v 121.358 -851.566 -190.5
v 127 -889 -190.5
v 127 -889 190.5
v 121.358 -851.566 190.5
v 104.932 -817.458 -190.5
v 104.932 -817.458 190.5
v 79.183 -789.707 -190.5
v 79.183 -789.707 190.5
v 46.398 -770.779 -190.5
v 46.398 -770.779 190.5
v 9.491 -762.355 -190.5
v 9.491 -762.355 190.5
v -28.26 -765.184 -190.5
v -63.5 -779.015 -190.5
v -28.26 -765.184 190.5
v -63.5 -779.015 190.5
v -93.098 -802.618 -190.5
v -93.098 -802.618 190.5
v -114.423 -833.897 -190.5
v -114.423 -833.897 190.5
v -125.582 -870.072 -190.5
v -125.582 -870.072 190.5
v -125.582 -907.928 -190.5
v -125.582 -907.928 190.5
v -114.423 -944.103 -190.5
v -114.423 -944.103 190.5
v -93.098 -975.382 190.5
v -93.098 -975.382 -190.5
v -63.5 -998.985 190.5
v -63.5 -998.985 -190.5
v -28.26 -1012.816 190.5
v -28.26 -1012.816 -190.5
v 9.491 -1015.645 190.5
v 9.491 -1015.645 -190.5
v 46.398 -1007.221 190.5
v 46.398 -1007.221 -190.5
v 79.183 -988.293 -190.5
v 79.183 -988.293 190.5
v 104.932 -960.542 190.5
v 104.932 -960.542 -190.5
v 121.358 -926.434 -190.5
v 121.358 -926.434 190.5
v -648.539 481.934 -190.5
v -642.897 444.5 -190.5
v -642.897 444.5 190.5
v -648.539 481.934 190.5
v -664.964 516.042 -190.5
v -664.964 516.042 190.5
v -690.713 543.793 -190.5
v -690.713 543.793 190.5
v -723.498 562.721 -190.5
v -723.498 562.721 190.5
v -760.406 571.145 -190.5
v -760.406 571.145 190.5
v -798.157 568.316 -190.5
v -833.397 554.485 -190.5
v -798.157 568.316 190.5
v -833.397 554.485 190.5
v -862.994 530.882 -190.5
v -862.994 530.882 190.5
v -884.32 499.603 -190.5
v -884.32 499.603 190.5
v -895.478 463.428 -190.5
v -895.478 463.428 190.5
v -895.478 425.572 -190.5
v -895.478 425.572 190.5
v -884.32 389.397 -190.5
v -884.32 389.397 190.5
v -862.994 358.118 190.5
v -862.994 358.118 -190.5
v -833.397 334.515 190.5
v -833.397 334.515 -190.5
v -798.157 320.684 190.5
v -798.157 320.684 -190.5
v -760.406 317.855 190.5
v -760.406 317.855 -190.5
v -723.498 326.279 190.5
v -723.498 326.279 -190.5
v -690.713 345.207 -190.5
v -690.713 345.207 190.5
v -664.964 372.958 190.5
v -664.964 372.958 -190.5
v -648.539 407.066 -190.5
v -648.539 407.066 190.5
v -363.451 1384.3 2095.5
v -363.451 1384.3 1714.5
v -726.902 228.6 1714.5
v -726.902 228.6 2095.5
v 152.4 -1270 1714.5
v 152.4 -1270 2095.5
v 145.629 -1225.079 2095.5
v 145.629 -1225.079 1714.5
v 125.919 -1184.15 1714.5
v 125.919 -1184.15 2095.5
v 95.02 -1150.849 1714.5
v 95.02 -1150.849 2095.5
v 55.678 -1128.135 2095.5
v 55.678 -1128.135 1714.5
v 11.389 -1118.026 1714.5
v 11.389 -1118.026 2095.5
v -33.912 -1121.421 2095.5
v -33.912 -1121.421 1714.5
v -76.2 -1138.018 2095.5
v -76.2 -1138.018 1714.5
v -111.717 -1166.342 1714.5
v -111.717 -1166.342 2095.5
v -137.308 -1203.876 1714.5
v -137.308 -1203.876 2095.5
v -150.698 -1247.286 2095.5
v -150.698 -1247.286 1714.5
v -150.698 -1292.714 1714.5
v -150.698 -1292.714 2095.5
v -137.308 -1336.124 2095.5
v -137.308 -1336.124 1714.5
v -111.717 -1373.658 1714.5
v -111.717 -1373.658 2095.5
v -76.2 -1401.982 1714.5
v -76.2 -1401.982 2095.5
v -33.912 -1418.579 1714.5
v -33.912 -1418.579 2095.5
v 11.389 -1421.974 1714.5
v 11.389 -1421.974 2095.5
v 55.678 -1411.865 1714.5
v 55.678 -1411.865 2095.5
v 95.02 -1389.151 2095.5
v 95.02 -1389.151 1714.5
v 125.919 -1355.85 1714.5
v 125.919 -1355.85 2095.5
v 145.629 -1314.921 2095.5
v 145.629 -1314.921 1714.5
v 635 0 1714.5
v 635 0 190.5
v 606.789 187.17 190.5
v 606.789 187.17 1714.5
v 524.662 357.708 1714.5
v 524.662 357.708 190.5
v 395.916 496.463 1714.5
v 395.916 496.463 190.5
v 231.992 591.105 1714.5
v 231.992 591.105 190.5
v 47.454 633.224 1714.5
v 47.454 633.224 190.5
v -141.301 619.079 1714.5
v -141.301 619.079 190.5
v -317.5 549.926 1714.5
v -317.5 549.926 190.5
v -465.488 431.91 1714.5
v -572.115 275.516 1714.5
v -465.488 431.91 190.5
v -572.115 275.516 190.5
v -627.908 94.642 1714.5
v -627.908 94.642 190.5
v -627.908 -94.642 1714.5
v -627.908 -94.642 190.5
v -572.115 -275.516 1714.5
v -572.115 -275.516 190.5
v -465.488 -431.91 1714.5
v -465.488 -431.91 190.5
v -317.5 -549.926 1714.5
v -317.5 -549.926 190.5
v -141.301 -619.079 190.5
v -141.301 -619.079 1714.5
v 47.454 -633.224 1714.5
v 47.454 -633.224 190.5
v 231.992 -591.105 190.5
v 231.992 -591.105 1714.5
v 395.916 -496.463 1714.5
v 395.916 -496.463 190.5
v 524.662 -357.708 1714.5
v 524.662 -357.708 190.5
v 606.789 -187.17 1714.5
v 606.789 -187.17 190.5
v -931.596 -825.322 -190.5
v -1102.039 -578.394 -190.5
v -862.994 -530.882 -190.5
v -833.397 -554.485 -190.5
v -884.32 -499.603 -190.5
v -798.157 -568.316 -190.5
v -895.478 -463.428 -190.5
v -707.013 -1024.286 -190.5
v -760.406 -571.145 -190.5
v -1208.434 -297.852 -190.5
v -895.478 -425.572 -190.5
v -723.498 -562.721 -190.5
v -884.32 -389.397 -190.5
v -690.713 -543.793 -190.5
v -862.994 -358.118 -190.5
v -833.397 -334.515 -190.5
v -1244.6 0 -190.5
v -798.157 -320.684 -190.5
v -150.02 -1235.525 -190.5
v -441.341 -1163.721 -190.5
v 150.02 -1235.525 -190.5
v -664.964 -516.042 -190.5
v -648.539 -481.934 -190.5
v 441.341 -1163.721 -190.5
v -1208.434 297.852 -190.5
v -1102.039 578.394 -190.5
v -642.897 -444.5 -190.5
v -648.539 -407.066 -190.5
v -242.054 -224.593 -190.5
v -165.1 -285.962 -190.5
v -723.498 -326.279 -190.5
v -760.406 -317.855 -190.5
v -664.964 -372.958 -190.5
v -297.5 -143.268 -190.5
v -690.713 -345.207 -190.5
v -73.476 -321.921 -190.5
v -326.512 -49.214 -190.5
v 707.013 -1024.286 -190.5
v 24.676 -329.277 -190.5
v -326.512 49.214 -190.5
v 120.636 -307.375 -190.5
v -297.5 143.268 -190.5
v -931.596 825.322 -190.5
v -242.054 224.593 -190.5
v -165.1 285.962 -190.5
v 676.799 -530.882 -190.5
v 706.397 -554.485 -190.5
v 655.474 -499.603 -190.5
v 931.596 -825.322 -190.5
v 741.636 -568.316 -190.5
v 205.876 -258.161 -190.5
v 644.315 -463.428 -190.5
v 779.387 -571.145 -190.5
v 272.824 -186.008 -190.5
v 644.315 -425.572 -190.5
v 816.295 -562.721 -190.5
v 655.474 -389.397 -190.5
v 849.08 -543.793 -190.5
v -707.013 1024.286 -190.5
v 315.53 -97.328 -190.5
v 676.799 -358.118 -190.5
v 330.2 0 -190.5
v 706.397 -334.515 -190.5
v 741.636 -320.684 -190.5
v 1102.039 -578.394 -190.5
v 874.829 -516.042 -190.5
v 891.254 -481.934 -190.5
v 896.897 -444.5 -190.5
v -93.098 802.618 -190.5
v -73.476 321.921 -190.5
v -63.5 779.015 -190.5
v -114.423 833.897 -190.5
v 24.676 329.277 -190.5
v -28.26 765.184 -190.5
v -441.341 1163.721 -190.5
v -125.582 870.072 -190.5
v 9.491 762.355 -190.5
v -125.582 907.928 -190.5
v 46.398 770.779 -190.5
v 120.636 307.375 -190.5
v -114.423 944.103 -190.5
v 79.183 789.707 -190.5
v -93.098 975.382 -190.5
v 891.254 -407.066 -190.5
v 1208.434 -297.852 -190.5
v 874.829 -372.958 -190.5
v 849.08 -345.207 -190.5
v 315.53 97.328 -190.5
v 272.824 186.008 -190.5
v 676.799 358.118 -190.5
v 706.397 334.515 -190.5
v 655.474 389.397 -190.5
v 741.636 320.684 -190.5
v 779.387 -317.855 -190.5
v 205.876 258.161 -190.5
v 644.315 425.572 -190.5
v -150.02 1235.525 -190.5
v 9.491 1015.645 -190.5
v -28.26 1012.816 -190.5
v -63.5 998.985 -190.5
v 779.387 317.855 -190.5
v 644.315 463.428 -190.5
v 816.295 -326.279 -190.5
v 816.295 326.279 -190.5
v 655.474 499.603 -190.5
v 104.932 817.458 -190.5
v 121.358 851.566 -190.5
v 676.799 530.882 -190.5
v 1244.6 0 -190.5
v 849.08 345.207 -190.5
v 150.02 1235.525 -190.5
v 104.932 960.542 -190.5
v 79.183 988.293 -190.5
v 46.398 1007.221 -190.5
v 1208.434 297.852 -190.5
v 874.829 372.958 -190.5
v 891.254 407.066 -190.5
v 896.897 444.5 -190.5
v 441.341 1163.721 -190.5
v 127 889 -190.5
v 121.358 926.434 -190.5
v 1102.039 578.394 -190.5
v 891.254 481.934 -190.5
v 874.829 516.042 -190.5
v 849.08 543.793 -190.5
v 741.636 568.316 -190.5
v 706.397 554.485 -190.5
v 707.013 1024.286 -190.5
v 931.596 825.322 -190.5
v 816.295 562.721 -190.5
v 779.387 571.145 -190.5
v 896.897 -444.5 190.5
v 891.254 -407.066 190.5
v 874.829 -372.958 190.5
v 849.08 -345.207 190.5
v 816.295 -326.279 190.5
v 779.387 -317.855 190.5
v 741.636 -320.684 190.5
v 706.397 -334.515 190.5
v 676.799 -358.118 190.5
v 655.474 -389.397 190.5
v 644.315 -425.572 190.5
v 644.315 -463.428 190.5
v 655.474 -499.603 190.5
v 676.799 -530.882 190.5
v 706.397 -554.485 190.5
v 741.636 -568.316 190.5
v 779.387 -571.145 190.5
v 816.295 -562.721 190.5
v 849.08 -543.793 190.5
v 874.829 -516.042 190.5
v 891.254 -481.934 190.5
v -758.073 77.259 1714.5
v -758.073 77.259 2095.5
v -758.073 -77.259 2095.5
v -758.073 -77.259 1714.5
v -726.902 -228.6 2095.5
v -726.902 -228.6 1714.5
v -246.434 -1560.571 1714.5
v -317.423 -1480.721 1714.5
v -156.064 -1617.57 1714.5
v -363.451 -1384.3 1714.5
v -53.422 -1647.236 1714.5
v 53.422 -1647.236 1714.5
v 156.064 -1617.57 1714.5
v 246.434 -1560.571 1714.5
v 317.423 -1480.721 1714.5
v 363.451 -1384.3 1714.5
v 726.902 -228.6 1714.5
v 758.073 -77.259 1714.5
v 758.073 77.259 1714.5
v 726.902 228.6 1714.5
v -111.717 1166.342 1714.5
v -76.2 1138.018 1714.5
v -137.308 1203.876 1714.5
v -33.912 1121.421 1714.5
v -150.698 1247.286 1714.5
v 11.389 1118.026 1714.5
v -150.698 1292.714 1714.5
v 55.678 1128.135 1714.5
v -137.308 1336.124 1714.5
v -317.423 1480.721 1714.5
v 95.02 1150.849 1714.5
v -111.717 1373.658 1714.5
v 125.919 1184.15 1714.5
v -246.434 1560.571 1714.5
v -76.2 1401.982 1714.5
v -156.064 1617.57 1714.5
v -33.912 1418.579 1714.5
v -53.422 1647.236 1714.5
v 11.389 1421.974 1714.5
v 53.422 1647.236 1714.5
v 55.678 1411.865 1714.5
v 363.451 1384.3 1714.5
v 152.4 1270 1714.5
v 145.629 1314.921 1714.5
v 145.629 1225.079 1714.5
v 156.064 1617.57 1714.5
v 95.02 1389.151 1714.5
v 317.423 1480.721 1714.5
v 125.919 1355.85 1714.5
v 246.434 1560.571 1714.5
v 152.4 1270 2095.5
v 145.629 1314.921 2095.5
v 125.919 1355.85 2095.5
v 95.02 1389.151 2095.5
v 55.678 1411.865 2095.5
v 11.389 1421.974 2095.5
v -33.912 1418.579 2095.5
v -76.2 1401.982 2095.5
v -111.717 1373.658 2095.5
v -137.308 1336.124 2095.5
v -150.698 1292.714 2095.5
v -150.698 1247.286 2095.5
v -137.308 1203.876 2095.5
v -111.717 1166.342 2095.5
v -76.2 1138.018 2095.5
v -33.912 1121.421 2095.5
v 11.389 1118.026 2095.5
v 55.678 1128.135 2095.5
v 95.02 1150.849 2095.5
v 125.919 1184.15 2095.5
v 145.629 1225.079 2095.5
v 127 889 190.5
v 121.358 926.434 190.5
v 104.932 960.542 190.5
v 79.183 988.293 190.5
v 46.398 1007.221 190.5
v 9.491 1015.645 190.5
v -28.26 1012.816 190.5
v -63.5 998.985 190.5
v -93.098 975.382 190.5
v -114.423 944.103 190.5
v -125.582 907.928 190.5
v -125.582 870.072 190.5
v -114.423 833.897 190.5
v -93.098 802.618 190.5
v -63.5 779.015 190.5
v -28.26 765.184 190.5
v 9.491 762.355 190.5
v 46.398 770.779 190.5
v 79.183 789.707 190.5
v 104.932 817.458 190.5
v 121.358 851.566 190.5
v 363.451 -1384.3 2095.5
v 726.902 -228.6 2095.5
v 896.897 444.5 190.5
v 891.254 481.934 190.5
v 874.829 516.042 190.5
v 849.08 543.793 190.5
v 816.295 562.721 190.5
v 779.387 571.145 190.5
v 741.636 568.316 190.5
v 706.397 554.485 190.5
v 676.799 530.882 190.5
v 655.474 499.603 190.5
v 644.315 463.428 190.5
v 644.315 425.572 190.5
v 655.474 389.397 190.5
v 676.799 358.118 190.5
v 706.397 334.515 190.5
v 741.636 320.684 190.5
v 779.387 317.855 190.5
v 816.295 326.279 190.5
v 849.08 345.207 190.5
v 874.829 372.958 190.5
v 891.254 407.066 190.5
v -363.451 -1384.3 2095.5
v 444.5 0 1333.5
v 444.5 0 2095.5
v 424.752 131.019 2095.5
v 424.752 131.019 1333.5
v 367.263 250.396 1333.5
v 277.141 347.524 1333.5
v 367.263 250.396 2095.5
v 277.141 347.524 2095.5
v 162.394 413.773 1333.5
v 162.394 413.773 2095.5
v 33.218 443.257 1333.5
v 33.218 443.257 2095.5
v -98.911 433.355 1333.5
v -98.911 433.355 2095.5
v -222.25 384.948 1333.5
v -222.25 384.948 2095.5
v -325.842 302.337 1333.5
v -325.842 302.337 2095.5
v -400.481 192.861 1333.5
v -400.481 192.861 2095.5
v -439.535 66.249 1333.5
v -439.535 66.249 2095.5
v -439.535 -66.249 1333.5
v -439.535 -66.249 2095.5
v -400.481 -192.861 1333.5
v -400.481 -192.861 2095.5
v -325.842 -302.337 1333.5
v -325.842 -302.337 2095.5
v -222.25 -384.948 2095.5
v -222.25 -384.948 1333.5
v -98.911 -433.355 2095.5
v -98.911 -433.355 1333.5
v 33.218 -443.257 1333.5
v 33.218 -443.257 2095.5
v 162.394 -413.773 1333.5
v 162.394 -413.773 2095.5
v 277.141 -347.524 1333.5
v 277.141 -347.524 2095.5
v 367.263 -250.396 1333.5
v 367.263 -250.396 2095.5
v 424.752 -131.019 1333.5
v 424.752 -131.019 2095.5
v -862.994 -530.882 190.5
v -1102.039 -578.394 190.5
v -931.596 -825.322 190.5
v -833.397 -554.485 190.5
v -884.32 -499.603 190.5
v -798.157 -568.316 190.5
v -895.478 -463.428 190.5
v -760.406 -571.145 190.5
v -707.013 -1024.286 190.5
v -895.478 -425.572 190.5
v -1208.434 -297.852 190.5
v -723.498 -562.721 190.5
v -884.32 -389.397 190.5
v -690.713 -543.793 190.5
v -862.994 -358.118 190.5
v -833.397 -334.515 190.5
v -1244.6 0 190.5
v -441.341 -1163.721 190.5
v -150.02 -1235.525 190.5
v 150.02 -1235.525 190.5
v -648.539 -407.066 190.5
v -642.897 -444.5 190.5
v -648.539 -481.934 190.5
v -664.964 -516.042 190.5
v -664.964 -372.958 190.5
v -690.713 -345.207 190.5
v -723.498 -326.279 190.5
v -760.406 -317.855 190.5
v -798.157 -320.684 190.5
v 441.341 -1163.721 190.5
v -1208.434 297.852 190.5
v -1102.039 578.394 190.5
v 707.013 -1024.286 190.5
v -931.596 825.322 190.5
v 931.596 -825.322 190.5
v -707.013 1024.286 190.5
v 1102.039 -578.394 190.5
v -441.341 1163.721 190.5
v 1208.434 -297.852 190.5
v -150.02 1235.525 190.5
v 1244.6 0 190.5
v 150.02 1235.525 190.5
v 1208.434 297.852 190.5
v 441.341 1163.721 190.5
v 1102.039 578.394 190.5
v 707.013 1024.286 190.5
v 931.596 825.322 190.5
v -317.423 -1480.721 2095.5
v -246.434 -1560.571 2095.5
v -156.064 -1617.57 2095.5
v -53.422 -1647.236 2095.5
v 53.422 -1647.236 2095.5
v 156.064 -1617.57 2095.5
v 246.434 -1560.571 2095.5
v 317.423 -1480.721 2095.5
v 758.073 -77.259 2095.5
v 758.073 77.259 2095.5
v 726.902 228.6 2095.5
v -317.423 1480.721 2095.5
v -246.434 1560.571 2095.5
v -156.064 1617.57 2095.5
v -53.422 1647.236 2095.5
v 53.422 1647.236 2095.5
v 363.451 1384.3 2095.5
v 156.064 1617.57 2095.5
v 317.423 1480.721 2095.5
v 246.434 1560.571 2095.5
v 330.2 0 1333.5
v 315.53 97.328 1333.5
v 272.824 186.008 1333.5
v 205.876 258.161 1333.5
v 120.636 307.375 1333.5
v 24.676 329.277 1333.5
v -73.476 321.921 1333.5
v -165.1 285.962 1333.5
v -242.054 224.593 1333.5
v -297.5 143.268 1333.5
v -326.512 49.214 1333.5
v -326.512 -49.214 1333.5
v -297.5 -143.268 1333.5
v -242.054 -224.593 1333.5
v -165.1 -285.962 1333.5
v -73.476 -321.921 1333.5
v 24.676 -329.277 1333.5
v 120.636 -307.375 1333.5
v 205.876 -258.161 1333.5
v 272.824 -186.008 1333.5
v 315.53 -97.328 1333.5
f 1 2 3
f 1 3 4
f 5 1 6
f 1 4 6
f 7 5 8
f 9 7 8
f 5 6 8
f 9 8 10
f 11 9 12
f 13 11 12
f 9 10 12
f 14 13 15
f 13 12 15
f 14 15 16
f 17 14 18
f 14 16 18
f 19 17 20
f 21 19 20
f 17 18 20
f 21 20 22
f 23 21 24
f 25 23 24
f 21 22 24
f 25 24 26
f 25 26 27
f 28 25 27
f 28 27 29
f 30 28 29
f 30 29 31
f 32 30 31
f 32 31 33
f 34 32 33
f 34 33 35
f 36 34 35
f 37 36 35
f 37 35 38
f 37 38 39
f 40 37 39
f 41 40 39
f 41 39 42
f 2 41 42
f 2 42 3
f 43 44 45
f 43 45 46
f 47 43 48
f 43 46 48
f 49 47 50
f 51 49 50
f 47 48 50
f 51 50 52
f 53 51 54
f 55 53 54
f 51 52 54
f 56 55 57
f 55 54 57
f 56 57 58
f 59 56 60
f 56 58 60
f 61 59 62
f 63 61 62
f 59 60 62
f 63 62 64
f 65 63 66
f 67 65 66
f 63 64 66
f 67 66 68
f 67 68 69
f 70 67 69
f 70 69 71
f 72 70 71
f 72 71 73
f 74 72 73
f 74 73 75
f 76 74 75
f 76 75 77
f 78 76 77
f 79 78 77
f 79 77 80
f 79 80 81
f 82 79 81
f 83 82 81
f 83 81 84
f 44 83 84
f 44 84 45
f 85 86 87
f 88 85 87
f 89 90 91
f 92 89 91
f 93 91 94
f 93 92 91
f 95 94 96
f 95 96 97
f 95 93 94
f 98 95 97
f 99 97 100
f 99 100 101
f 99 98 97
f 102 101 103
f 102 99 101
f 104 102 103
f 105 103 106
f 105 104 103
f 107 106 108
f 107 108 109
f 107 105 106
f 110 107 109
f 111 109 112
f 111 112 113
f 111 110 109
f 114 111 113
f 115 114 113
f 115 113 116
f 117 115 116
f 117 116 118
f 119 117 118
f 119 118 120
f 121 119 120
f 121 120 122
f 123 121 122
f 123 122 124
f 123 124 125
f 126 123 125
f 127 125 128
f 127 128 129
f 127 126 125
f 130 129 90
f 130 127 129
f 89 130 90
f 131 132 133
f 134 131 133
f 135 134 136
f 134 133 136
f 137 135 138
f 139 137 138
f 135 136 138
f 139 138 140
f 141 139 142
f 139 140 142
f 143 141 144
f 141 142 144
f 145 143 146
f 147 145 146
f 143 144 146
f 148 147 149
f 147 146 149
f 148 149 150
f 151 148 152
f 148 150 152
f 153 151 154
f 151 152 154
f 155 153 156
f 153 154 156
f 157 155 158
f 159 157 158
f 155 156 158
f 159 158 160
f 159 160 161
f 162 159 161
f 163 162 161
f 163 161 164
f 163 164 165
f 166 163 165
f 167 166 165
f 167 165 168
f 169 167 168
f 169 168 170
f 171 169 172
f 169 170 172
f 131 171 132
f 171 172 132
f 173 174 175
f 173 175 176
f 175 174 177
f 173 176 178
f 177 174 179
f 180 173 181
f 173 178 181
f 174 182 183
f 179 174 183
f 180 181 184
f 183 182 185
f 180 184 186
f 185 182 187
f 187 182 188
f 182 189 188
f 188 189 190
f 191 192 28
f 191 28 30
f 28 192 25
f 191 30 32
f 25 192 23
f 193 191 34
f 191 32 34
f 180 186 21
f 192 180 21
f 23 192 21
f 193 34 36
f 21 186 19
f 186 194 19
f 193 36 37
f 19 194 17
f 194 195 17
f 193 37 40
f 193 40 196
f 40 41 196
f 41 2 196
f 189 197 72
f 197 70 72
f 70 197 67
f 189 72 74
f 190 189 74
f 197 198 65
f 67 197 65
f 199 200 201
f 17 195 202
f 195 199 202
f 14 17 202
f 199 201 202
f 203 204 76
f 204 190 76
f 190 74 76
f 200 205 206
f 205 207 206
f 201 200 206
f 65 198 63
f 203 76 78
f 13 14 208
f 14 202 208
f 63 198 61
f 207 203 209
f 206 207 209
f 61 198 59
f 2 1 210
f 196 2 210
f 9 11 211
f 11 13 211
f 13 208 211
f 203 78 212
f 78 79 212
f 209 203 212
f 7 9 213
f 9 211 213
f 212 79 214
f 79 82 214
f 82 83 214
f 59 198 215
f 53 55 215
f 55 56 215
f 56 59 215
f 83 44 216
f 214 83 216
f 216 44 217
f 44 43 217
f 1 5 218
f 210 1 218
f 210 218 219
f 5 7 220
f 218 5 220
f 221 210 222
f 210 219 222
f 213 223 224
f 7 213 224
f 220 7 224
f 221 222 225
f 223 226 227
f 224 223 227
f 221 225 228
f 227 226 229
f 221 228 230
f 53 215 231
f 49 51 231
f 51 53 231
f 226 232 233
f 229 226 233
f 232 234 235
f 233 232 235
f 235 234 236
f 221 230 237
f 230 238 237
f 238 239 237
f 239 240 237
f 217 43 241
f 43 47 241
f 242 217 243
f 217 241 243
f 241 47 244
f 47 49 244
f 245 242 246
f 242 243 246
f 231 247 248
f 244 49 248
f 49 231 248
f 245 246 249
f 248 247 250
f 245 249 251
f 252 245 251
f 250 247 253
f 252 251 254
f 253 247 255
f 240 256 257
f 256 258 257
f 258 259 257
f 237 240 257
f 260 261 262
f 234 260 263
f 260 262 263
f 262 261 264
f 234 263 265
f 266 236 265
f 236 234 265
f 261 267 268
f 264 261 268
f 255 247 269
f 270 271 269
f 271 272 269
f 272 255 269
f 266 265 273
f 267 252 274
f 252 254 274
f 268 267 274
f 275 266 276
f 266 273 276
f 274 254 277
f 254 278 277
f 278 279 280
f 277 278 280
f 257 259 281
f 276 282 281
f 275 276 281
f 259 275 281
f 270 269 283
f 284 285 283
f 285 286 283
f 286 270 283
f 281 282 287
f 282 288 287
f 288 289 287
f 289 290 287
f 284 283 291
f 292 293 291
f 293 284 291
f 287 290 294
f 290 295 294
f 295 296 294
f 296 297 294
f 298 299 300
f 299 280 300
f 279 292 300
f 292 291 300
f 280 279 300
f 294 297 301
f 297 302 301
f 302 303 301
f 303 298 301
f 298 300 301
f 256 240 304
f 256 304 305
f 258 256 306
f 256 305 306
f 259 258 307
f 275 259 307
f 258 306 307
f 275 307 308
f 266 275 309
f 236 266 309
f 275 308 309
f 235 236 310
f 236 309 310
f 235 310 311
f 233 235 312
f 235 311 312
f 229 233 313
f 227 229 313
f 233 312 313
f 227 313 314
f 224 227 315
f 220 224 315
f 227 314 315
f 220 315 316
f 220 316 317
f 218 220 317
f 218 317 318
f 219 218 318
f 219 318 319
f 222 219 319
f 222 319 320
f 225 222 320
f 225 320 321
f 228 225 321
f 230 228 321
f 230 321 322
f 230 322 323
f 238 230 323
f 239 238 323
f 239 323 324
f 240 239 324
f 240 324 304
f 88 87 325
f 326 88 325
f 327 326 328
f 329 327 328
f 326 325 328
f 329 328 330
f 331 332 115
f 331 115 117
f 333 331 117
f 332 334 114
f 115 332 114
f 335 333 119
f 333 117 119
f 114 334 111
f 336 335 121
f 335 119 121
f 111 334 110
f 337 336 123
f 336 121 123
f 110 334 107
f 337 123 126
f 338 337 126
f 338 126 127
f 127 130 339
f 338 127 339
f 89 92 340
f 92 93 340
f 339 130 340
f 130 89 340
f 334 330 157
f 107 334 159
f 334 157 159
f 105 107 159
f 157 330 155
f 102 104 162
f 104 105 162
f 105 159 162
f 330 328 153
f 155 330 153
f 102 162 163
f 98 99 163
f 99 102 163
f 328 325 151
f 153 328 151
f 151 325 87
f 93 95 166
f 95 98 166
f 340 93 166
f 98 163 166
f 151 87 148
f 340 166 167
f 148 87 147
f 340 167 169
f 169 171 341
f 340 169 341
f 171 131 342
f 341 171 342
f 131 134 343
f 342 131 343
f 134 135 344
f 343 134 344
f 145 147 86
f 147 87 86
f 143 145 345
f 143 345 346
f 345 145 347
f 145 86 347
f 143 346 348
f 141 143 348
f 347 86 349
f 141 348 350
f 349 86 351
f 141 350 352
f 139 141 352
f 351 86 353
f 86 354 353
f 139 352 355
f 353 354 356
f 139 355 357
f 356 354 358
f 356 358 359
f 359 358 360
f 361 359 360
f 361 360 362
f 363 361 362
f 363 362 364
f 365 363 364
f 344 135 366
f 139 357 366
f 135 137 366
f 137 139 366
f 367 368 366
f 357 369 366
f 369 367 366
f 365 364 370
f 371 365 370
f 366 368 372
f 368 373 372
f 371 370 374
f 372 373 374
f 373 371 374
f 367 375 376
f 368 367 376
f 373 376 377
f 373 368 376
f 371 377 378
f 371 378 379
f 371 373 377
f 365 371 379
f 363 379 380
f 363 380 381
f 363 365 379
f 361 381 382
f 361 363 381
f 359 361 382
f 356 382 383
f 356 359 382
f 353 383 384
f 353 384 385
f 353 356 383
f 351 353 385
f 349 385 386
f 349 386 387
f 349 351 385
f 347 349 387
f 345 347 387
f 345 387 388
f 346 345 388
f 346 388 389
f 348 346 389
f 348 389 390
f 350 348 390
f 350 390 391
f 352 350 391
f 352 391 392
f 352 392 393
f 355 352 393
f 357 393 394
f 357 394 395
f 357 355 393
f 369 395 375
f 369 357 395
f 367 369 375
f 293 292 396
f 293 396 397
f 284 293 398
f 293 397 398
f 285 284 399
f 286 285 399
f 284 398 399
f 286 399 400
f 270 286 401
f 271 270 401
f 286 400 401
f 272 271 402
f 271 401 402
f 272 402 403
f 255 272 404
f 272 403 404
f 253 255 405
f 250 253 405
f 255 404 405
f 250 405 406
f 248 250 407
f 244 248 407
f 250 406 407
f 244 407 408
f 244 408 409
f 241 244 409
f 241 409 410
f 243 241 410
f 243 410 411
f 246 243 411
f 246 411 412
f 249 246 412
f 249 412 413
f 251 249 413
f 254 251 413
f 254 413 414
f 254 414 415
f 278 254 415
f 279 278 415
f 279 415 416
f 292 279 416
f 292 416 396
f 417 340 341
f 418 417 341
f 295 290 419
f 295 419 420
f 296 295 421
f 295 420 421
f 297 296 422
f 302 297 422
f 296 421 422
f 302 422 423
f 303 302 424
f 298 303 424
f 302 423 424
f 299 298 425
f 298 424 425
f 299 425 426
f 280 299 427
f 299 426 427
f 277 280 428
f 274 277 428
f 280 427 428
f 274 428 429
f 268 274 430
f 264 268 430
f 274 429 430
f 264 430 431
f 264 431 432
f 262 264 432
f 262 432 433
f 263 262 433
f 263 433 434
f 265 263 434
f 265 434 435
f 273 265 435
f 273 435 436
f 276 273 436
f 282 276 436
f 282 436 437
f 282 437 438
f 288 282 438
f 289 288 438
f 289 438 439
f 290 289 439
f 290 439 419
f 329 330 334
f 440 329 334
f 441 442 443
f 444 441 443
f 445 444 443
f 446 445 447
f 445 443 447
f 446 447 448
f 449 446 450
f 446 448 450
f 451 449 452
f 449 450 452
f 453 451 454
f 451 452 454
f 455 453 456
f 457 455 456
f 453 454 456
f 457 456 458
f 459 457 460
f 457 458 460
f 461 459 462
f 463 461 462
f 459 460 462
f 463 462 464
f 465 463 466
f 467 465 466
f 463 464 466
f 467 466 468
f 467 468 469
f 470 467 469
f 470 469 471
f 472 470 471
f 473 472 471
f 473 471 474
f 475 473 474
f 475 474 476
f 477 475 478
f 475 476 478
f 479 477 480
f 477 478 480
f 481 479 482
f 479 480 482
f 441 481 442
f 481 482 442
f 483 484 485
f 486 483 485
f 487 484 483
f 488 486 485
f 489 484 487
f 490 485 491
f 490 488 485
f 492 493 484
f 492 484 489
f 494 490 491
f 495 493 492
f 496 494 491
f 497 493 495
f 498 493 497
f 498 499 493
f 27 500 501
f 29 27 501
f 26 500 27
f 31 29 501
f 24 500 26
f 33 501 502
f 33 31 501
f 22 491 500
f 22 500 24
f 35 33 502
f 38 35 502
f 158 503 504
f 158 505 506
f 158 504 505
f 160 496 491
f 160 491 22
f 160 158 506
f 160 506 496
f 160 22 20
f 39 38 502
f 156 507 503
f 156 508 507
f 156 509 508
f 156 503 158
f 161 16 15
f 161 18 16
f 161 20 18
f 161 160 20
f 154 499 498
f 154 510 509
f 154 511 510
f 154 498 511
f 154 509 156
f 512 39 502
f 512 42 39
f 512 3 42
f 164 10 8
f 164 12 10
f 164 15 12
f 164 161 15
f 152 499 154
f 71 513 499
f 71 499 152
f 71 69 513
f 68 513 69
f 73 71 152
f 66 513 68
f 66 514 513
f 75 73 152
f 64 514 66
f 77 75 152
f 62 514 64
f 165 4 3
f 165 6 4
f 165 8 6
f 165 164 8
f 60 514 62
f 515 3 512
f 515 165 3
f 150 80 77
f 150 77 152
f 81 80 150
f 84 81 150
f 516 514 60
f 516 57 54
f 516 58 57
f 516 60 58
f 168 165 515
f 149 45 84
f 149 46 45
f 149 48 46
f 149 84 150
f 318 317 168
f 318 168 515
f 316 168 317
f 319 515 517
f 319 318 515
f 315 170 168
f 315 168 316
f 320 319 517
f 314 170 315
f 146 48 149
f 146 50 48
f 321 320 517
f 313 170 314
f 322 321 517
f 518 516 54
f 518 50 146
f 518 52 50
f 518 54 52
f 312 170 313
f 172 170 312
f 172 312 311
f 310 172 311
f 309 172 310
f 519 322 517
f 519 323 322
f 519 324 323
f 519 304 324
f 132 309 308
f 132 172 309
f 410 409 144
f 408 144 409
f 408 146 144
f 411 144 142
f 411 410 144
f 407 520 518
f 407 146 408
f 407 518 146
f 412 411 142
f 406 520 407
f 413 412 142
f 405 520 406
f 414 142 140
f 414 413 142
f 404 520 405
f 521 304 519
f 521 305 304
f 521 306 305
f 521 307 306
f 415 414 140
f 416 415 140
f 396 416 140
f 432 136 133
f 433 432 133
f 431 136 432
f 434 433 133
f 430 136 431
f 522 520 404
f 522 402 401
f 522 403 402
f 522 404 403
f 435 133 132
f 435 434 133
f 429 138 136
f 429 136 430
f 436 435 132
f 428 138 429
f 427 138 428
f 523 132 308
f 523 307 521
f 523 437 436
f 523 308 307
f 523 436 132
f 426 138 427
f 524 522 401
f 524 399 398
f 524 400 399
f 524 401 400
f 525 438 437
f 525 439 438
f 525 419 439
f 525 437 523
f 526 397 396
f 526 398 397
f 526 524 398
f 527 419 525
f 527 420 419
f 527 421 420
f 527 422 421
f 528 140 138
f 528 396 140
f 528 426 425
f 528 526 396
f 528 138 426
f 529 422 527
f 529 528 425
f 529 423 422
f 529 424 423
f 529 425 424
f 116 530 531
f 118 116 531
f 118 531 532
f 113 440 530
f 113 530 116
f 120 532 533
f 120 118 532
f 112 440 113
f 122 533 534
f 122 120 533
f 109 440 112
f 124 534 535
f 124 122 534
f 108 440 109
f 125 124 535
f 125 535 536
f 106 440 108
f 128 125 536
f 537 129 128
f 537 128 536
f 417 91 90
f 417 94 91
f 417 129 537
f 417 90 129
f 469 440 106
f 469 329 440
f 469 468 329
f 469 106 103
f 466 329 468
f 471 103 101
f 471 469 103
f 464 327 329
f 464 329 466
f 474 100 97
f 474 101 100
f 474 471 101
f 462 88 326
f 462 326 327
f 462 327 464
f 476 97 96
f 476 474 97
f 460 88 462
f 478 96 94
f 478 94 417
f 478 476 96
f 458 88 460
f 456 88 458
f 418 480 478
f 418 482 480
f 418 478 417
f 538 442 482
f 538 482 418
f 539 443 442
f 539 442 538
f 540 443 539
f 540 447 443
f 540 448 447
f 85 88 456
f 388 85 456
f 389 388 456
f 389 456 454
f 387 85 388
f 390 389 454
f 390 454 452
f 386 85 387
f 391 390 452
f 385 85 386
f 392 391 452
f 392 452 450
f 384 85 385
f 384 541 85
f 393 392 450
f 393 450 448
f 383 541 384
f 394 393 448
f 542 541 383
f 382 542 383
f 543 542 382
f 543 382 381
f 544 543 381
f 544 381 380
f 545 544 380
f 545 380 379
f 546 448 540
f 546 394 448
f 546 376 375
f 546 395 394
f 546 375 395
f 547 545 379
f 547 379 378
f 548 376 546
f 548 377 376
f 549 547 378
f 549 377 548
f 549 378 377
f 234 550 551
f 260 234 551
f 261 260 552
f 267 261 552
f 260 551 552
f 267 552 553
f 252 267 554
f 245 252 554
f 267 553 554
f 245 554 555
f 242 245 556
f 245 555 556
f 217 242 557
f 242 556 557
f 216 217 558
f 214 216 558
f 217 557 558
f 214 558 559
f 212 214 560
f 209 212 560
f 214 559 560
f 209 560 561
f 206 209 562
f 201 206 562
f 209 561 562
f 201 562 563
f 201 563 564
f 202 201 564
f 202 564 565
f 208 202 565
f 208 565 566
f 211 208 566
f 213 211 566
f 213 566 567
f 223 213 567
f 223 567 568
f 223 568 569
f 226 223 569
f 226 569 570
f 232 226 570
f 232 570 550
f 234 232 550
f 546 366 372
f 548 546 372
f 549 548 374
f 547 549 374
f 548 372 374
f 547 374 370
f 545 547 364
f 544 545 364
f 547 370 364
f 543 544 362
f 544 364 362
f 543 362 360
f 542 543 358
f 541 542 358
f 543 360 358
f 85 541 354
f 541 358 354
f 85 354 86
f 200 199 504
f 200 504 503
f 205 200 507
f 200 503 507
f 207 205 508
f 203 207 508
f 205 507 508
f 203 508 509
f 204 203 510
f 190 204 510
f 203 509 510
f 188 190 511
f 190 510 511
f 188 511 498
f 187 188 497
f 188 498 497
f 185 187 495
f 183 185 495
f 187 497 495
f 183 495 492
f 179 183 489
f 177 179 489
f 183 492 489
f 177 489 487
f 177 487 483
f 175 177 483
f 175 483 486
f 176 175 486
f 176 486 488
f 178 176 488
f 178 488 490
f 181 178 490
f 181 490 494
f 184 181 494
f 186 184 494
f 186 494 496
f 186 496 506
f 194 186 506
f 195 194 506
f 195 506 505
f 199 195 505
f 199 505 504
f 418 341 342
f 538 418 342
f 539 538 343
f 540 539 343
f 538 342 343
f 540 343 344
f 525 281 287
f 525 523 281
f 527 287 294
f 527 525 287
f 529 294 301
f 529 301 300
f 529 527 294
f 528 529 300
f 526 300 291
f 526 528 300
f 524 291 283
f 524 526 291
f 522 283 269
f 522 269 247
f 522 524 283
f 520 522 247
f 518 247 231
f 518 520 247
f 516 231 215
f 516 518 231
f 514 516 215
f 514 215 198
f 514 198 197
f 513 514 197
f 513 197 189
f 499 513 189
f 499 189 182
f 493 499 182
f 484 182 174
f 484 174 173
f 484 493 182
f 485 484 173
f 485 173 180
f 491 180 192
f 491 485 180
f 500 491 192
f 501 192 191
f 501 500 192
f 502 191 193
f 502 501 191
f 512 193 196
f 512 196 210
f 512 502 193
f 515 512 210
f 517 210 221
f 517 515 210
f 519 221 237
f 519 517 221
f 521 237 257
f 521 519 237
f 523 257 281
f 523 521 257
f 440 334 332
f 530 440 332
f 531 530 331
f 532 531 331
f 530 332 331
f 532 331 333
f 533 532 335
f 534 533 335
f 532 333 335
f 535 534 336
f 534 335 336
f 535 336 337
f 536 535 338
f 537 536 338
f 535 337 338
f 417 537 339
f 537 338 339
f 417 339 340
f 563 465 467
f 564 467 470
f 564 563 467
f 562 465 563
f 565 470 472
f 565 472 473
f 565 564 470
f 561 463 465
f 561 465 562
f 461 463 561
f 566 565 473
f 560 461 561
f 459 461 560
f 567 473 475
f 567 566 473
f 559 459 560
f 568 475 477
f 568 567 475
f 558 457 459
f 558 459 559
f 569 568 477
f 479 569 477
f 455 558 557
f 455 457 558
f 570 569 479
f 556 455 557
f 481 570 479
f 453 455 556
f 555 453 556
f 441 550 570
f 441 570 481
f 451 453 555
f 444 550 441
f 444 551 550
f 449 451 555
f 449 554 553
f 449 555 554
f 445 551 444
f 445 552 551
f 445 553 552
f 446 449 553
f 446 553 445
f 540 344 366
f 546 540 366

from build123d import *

# Parameters (mm, degrees)
SKETCH1_R           = 1244.6
BOSS_EXTRUDE1_DEPTH = 190.5
SKETCH2_R           = 127
CUT_EXTRUDE1_DEPTH  = 1801.894033529
SKETCH3_R           = 635
BOSS_EXTRUDE2_DEPTH = 1524
SKETCH5_R           = 152.4
BOSS_EXTRUDE3_DEPTH = 381
SKETCH6_R           = 444.5
BOSS_EXTRUDE4_DEPTH = 762
SKETCH7_R           = 444.5
CUT_EXTRUDE2_DEPTH  = 762
SKETCH8_R           = 330.2
CUT_EXTRUDE3_DEPTH  = 2569.541640698


with BuildPart() as part:
    # Sketch1 → Boss-Extrude1 (new, symmetric)
    with BuildSketch(Plane.XY):
        Circle(SKETCH1_R)
    extrude(amount=BOSS_EXTRUDE1_DEPTH, both=True)

    # Sketch2 → Cut-Extrude1 (cut, through all)
    with BuildSketch(Plane.XY.offset(190.5)):
        with Locations((0, 889)):
            Circle(SKETCH2_R)
        with Locations((769.896583964, 444.5)):
            Circle(SKETCH2_R)
        with Locations((769.896583964, -444.5)):
            Circle(SKETCH2_R)
        with Locations((0, -889)):
            Circle(SKETCH2_R)
        with Locations((-769.896583964, -444.5)):
            Circle(SKETCH2_R)
        with Locations((-769.896583964, 444.5)):
            Circle(SKETCH2_R)
    extrude(amount=-CUT_EXTRUDE1_DEPTH, mode=Mode.SUBTRACT)

    # Sketch3 → Boss-Extrude2 (add)
    with BuildSketch(Plane.XY.offset(190.5)):
        Circle(SKETCH3_R)
    extrude(amount=BOSS_EXTRUDE2_DEPTH)

    # Sketch5 → Boss-Extrude3 (add)
    with BuildSketch(Plane.XY.offset(1714.5)):
        with BuildLine():
            Line((-363.45083574, 1384.3), (-726.90167148, 228.6))
            ThreePointArc((-726.90167148, 228.6), (-762, 0), (-726.90167148, -228.6))
            Line((-726.90167148, -228.6), (-363.45083574, -1384.3))
            ThreePointArc((-363.45083574, -1384.3), (0, -1651), (363.45083574, -1384.3))
            Line((363.45083574, -1384.3), (726.90167148, -228.6))
            ThreePointArc((726.90167148, -228.6), (762, 0), (726.90167148, 228.6))
            Line((726.90167148, 228.6), (363.45083574, 1384.3))
            ThreePointArc((363.45083574, 1384.3), (0, 1651), (-363.45083574, 1384.3))
        make_face()
        with Locations((0, 1270)):
            Circle(SKETCH5_R, mode=Mode.SUBTRACT)
        with Locations((0, -1270)):
            Circle(SKETCH5_R, mode=Mode.SUBTRACT)
    extrude(amount=BOSS_EXTRUDE3_DEPTH)

    # Sketch6 → Boss-Extrude4 (add)
    with BuildSketch(Plane.XY.offset(2095.5)):
        Circle(SKETCH6_R)
    extrude(amount=-BOSS_EXTRUDE4_DEPTH)

    # Sketch7 → Cut-Extrude2 (cut)
    with BuildSketch(Plane.XY.offset(2095.5)):
        Circle(SKETCH7_R)
    extrude(amount=-CUT_EXTRUDE2_DEPTH, mode=Mode.SUBTRACT)

    # Sketch8 → Cut-Extrude3 (cut, through all)
    with BuildSketch(Plane.XY.offset(1333.5)):
        Circle(SKETCH8_R)
    extrude(amount=-CUT_EXTRUDE3_DEPTH, mode=Mode.SUBTRACT)


solid = part.part
